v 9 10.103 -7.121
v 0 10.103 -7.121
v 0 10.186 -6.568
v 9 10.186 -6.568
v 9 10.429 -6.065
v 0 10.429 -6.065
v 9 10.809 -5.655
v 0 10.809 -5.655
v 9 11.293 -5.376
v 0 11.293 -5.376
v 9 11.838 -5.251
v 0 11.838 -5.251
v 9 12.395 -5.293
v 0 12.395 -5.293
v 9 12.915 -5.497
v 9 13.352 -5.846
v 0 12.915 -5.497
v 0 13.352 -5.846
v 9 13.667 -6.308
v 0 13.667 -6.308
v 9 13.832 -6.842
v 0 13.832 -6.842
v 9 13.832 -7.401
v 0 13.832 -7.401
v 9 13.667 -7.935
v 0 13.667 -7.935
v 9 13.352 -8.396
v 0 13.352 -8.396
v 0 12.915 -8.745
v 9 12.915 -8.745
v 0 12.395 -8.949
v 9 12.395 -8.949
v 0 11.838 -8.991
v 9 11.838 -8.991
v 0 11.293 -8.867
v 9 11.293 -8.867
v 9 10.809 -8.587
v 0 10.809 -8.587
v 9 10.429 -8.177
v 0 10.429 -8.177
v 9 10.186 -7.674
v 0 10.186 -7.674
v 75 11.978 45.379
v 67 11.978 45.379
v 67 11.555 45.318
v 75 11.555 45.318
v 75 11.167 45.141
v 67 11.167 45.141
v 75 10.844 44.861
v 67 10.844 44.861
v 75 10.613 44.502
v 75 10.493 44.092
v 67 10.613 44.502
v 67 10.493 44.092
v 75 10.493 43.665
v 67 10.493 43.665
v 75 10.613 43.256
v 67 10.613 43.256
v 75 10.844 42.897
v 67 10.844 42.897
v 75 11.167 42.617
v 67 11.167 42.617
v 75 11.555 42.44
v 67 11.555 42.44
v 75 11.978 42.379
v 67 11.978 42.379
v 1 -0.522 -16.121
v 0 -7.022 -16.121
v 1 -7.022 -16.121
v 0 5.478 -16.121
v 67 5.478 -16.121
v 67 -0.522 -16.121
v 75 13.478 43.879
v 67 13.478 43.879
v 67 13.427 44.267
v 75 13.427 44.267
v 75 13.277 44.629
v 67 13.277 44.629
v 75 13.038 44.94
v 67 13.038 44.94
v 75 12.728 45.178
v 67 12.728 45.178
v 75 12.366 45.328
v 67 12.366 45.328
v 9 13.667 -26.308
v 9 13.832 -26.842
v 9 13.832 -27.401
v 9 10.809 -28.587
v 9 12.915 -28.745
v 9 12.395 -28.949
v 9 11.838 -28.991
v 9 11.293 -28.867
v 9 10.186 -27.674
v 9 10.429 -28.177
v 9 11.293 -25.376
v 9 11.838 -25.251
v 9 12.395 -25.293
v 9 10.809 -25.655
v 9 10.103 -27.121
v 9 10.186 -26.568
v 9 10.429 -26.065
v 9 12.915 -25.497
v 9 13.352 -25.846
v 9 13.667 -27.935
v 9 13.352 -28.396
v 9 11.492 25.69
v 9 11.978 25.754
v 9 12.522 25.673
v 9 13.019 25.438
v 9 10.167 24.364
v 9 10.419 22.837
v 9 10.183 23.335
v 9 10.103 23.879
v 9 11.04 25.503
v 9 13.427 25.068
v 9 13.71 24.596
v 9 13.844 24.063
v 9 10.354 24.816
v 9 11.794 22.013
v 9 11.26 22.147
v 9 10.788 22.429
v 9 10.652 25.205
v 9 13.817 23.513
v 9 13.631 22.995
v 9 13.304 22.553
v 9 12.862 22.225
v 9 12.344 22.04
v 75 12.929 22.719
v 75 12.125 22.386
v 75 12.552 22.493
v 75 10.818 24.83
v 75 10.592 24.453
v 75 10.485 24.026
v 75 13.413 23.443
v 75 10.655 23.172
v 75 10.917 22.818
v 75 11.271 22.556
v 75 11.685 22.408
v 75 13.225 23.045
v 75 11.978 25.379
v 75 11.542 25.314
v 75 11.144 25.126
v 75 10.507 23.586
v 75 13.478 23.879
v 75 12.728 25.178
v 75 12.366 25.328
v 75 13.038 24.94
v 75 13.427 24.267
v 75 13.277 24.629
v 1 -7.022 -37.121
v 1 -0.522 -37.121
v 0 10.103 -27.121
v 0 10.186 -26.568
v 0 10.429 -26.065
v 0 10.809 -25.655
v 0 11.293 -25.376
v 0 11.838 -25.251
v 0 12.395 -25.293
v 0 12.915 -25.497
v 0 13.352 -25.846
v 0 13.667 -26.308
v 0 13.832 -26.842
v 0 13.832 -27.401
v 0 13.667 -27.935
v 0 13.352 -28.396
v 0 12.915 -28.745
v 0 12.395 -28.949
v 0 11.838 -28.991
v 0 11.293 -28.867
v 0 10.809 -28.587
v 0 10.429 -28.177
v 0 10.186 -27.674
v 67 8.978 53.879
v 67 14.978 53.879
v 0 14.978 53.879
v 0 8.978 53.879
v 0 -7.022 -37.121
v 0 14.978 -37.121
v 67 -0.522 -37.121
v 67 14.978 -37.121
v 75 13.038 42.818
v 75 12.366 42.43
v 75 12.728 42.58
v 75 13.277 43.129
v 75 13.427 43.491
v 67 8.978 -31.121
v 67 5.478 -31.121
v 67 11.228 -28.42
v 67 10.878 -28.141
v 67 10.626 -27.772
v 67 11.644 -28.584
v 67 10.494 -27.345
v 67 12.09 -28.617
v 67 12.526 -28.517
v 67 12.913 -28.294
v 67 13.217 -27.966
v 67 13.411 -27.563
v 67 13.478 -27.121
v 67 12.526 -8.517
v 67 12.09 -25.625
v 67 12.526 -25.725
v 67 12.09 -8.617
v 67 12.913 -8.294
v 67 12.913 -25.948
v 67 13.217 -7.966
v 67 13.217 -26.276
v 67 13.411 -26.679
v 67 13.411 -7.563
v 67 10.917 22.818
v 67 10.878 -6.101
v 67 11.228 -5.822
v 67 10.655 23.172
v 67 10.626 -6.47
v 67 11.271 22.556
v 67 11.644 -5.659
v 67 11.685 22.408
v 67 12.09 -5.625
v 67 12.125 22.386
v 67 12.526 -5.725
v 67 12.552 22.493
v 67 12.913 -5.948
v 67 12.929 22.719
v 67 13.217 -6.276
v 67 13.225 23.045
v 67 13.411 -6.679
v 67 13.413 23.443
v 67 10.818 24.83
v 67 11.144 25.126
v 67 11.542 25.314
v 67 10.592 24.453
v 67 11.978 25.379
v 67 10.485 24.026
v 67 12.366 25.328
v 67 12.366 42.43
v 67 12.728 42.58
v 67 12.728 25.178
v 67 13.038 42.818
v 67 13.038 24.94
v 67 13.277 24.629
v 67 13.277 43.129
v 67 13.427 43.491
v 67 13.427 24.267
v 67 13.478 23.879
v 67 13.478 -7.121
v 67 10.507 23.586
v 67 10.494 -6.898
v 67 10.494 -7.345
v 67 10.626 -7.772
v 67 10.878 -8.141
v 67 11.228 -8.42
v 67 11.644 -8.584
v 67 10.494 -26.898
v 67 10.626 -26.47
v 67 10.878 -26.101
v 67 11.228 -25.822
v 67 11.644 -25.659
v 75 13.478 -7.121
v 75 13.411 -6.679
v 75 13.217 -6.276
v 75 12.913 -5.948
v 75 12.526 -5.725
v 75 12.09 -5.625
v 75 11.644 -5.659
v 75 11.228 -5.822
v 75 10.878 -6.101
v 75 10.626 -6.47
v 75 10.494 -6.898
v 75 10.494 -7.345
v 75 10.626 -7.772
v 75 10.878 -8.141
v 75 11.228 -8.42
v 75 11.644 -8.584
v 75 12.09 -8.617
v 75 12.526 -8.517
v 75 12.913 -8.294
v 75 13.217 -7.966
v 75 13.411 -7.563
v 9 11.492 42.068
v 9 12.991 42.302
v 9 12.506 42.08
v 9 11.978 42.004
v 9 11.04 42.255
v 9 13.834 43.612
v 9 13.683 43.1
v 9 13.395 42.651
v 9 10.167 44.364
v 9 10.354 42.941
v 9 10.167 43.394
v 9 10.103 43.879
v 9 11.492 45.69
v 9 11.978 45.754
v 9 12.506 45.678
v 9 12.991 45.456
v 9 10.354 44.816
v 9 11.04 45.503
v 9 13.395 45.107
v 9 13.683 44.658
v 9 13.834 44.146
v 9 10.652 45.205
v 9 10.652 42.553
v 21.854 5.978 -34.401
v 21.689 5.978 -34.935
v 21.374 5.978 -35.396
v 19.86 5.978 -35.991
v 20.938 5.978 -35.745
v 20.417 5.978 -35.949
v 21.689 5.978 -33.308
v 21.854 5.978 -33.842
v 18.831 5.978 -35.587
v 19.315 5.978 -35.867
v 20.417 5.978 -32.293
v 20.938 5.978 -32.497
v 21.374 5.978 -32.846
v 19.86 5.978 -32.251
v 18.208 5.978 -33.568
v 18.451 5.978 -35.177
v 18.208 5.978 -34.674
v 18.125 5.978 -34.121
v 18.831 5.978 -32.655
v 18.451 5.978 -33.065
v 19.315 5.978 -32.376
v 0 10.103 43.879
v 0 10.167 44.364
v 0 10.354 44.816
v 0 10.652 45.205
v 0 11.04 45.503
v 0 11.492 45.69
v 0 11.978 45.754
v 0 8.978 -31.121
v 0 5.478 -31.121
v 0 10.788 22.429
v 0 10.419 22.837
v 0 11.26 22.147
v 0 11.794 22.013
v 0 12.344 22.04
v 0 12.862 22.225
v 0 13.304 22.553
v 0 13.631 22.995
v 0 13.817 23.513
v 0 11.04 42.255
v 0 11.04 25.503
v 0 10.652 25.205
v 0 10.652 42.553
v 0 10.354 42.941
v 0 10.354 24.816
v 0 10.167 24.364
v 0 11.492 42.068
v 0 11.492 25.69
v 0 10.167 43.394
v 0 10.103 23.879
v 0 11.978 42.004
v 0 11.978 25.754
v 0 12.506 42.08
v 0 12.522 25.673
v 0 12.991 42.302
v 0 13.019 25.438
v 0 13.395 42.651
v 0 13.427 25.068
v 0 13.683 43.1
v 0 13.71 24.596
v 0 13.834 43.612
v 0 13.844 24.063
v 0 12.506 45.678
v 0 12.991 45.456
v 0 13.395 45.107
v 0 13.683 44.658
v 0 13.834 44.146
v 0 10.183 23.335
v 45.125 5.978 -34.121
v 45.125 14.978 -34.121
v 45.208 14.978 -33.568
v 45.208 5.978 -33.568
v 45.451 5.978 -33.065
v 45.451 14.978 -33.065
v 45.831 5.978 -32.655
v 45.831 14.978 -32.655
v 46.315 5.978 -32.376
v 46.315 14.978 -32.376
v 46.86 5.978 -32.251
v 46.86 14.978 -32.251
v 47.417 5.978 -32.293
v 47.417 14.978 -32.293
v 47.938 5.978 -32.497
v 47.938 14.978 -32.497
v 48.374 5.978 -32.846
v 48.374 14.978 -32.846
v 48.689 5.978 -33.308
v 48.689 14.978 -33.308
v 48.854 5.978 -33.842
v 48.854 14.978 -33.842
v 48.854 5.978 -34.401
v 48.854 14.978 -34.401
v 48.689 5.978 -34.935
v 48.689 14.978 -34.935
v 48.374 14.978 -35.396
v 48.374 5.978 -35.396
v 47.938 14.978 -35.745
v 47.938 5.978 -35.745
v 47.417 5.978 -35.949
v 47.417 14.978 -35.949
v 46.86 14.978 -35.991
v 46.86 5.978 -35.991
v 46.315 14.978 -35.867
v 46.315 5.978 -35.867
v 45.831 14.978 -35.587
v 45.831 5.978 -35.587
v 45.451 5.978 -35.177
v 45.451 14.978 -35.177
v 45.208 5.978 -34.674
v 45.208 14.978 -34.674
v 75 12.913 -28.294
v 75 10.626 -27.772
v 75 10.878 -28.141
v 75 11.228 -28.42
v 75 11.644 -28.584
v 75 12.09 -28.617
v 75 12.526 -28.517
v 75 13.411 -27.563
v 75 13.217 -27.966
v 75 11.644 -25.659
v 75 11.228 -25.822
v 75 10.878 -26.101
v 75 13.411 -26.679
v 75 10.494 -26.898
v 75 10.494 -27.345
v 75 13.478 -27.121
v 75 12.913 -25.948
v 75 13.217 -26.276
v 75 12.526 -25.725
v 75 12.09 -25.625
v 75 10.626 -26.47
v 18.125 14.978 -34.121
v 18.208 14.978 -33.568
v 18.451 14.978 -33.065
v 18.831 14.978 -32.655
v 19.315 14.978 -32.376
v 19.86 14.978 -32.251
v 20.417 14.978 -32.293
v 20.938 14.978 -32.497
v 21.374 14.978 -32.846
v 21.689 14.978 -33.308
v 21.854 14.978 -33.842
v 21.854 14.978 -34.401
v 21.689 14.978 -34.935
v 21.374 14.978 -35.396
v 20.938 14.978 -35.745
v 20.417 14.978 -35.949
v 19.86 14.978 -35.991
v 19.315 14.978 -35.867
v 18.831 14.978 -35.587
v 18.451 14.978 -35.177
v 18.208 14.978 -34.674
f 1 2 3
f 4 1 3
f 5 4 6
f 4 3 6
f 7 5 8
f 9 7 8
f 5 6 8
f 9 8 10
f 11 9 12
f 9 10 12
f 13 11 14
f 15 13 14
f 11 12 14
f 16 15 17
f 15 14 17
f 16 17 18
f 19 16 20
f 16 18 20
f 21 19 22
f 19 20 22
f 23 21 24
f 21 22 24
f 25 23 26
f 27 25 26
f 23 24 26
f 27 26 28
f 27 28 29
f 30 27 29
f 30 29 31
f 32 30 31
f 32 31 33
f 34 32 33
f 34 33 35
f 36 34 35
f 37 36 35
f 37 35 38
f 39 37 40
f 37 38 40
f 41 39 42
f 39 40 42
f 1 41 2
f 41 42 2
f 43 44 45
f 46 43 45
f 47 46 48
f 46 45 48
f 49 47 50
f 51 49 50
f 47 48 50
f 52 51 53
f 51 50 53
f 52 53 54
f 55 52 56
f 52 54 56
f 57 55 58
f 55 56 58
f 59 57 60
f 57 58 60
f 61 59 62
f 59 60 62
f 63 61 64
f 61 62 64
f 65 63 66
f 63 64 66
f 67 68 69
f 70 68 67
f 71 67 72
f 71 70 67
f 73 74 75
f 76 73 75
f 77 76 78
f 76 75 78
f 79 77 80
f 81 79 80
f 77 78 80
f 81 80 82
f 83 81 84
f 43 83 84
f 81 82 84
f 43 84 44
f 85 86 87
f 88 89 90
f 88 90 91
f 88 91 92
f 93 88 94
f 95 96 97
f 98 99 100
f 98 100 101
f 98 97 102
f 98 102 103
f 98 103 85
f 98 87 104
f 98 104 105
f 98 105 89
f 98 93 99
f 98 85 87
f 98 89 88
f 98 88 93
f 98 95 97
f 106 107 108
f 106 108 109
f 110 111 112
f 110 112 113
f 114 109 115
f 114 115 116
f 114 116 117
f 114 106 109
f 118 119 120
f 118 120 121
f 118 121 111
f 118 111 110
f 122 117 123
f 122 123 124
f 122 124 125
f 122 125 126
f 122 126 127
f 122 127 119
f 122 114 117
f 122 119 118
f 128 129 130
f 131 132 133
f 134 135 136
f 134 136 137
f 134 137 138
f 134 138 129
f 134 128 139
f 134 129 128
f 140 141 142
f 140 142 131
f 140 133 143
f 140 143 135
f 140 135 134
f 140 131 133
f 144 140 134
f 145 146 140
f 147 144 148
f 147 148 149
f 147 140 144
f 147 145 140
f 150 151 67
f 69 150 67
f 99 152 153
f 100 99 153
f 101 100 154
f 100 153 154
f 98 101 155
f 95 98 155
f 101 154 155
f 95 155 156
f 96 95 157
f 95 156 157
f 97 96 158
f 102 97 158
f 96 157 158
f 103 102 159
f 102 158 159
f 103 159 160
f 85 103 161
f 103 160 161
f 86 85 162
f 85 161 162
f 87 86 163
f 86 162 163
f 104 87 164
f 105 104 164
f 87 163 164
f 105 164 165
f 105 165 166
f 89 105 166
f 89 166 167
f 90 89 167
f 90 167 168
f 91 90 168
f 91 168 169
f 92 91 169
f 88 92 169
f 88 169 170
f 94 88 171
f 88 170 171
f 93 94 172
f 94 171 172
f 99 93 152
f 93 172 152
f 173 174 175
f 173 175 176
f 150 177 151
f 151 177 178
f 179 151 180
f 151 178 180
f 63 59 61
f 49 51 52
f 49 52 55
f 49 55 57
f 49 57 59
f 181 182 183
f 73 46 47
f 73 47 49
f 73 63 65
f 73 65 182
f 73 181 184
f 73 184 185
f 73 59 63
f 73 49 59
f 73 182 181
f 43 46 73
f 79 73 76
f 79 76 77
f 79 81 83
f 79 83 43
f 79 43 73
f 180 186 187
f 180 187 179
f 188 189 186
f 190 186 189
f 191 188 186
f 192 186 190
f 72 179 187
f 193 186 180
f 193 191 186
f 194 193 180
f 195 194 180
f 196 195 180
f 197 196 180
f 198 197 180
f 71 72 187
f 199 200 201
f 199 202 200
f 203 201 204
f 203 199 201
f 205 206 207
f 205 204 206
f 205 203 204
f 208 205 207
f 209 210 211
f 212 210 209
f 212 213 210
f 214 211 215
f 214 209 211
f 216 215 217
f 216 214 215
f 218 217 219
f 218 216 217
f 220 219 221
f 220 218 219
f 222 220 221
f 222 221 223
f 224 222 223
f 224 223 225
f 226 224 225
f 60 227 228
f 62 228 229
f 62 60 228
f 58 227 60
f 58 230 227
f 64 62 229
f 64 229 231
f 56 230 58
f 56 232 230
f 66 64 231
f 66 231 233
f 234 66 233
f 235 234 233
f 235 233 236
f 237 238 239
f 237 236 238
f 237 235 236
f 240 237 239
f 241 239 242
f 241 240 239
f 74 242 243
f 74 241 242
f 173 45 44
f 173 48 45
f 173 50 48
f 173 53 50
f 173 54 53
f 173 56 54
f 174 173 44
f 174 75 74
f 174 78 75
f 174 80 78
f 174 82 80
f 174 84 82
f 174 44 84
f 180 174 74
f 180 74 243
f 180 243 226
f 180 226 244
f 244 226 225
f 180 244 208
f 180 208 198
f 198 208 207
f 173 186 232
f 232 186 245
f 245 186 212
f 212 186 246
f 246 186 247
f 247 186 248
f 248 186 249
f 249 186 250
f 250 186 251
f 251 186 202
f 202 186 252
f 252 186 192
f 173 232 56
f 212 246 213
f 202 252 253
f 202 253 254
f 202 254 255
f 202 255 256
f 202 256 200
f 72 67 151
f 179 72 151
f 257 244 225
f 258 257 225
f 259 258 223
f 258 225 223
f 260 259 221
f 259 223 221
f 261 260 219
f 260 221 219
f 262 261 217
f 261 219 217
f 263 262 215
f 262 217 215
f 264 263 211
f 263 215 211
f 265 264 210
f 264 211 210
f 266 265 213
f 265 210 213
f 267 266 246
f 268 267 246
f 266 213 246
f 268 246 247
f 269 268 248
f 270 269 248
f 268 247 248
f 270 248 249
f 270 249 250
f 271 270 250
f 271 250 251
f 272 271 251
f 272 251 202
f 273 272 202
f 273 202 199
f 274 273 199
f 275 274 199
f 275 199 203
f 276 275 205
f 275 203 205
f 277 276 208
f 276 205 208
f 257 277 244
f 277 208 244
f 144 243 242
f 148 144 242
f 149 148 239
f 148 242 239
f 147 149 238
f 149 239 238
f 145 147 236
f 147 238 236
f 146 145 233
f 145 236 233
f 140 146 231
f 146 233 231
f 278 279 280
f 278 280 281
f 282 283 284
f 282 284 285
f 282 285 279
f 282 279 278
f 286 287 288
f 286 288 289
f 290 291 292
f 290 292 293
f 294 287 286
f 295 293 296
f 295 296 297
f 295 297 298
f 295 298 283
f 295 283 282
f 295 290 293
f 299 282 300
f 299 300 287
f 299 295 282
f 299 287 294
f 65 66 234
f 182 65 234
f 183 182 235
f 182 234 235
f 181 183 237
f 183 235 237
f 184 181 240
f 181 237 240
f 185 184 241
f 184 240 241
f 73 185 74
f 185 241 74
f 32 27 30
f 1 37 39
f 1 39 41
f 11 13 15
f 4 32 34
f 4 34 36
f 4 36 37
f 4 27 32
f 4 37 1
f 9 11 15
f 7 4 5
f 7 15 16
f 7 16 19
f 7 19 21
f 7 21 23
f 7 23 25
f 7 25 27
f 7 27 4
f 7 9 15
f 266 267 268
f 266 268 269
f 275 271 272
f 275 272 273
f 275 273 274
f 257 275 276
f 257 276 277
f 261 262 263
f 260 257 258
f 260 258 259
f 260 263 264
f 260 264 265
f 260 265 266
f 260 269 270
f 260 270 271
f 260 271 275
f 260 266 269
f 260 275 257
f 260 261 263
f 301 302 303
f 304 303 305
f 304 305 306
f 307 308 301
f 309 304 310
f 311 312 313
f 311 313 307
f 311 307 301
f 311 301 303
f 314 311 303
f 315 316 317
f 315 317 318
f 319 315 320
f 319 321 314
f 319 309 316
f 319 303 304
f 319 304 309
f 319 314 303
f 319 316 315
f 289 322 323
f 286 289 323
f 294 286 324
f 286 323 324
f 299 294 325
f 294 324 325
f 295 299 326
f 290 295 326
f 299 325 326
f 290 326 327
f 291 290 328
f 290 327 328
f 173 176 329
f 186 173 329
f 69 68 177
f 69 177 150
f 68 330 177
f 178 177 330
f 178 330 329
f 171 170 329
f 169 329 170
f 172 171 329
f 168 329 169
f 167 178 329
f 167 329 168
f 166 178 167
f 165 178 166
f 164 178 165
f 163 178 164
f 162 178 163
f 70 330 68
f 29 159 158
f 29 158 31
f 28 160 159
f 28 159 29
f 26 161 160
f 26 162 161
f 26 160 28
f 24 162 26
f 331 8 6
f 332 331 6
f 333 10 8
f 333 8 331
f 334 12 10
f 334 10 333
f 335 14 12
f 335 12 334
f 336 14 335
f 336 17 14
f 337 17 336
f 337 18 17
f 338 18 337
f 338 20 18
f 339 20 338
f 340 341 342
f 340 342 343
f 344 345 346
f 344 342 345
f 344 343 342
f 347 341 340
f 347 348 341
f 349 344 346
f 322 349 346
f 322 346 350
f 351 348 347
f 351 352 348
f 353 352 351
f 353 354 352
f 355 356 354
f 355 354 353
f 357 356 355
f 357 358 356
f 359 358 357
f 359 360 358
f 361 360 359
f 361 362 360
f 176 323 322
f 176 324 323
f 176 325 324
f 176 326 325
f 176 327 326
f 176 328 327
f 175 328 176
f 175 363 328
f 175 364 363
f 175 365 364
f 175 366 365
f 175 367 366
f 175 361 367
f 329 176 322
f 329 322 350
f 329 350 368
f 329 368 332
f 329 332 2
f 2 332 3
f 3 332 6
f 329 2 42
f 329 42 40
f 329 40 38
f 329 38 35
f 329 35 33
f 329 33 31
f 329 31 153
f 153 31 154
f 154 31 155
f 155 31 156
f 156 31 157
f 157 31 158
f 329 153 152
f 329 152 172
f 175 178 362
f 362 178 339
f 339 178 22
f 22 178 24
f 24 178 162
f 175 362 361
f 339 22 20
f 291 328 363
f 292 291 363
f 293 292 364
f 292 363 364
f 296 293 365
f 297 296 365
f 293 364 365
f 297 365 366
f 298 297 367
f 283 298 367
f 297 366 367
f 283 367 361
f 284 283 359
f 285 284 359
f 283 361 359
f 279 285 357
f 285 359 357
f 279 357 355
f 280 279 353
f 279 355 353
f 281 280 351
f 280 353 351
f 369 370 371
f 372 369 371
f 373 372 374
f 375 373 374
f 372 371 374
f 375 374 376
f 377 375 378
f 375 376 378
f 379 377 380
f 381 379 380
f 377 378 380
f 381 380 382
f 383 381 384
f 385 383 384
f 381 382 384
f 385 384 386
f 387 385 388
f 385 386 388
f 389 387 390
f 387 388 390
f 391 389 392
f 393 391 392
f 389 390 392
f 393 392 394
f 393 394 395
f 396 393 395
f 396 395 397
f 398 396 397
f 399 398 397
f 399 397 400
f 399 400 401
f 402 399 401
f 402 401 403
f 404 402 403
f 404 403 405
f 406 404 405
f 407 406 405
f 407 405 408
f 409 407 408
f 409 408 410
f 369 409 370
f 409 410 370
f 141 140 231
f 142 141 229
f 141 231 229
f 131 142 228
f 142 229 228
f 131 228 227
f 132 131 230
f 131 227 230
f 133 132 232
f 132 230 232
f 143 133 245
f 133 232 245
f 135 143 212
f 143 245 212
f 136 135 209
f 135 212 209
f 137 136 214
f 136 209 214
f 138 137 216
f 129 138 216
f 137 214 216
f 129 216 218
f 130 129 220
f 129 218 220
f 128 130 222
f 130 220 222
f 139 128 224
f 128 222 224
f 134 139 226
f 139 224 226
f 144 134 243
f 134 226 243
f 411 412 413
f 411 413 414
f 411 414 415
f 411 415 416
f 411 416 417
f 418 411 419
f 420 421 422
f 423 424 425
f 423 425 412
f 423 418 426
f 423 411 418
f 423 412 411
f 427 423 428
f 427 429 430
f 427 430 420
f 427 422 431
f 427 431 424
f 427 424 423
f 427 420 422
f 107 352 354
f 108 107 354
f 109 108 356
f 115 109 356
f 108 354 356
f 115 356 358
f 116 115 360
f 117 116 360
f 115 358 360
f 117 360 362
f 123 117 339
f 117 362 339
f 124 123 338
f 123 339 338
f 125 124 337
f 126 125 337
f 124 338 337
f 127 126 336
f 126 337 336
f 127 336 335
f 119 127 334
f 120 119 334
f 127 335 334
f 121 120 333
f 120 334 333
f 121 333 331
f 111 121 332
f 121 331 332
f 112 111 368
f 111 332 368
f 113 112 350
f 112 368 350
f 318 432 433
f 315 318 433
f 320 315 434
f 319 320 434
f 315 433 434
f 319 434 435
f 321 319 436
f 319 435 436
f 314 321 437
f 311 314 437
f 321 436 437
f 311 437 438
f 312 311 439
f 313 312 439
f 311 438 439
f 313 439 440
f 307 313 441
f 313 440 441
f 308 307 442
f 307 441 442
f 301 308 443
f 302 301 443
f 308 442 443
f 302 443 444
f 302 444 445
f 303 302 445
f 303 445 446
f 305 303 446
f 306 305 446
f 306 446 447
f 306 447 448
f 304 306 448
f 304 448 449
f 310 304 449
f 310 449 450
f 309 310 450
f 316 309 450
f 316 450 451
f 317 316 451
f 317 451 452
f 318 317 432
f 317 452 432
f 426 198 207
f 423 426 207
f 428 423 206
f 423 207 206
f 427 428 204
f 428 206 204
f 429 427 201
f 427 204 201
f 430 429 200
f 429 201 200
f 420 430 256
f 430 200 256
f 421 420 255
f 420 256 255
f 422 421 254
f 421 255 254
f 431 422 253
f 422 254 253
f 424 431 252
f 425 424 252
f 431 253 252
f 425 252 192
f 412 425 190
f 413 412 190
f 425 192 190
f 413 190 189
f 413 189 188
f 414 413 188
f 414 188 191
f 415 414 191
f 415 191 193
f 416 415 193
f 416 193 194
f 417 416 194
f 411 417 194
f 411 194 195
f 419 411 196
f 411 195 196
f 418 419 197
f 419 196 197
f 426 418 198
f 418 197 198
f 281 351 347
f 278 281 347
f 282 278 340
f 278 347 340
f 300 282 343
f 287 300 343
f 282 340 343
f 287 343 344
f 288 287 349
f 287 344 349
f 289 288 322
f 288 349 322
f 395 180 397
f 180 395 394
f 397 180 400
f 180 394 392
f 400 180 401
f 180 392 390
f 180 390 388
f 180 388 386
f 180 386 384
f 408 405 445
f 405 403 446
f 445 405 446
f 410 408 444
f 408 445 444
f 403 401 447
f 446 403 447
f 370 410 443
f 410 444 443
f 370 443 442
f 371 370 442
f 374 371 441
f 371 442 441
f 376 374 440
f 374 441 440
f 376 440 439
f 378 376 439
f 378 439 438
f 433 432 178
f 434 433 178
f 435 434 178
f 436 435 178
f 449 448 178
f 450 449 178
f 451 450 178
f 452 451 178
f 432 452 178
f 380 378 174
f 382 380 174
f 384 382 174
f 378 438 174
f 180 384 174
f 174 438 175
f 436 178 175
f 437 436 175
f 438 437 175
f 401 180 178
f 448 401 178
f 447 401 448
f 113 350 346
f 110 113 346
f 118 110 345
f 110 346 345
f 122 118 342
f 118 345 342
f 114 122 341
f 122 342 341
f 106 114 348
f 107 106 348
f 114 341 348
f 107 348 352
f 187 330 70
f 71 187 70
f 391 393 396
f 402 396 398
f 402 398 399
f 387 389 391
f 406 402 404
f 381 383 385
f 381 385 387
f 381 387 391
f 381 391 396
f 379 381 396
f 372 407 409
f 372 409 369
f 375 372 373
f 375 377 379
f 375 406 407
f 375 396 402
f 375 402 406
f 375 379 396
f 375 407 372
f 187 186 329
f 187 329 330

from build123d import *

# Parameters (mm, degrees)
F1_DEPTH  = 67
F2_R      = 1.5
F3_DEPTH  = 8
F4_R      = 1.875
F5_DEPTH  = 9
F6_R      = 1.875
F7_DEPTH  = 9
F8_W      = 1
F8_H      = 21
F9_DEPTH  = 6.5
F10_R     = 1.875
F11_DEPTH = 9


# Not quite as in the source:
# - a feature names something its author has since deleted; it is built from what else it names


with BuildPart() as f1:
    # F0 (on Right) → F1 (new body)
    with BuildSketch(Plane.YZ):
        Polygon((14.9777059274, -37.1211464703), (14.9777059274, 53.8788535297), (8.9777059274, 53.8788535297), (8.9777059274, -31.1211464703), (5.4777059274, -31.1211464703), (5.4777059274, -16.1211464703), (-0.5222940726, -16.1211464703), (-0.5222940726, -37.1211464703), align=None)
    extrude(amount=F1_DEPTH)

    # F2 (on face) → F3 (join)
    with BuildSketch(Plane.YZ.offset(67)):
        with BuildLine():
            Line((11.9777059274, 43.8788535297), (11.9777059274, 45.3788535297))
            ThreePointArc((11.9777059274, 45.3788535297), (10.4777059274, 43.8788535297), (11.9777059274, 42.3788535297))
            Line((11.9777059274, 42.3788535297), (11.9777059274, 43.8788535297))
        make_face()
        with BuildLine():
            ThreePointArc((11.9777059274, 42.3788535297), (13.0383660992, 42.8181933579), (13.4777059274, 43.8788535297))
            ThreePointArc((13.4777059274, 43.8788535297), (13.0383660992, 44.9395137015), (11.9777059274, 45.3788535297))
            Line((11.9777059274, 45.3788535297), (11.9777059274, 43.8788535297))
            Line((11.9777059274, 43.8788535297), (11.9777059274, 42.3788535297))
        make_face()
        with BuildLine():
            ThreePointArc((13.4777059274, 23.8788535297), (13.0383660992, 24.9395137015), (11.9777059274, 25.3788535297))
            ThreePointArc((11.9777059274, 25.3788535297), (10.9170457557, 22.8181933579), (13.4777059274, 23.8788535297))
        make_face()
        with Locations((11.9777059274, -7.1211464703)):
            Circle(F2_R)
        with Locations((11.9777059274, -27.1211464703)):
            Circle(F2_R)
    extrude(amount=F3_DEPTH)

    # F4 (on face) → F5 (cut)
    with BuildSketch(Plane(origin=(0, 0, 0), x_dir=(0, -1, 0), z_dir=(-1, 0, 0))):
        with Locations((-18.4777059274, 23.8788535297)):
            Circle(F4_R)
        with Locations((-18.4777059274, 43.8788535297)):
            Circle(F4_R)
        with Locations((-18.4777059274, -7.1211464703)):
            Circle(F4_R)
        with Locations((-18.4777059274, -27.1211464703)):
            Circle(F4_R)
    extrude(amount=-F5_DEPTH, mode=Mode.SUBTRACT)

    # F6 (on face) → F7 (cut)
    with BuildSketch(Plane(origin=(0, 14.9777059274, 0), x_dir=(-1, 0, 0), z_dir=(0, 1, 0))):
        with Locations((-47, -34.1211464703)):
            Circle(F6_R)
        with Locations((-20, -34.1211464703)):
            Circle(F6_R)
    extrude(amount=-F7_DEPTH, mode=Mode.SUBTRACT)

    # F8 (on face) → F9 (join)
    with BuildSketch(Plane.XZ.offset(0.5222940726)):
        with Locations((0.5, -26.6211464703)):
            Rectangle(F8_W, F8_H)
    extrude(amount=F9_DEPTH)

    # F10 (on face) → F11 (cut)
    with BuildSketch(Plane(origin=(0, 0, 0), x_dir=(0, -1, 0), z_dir=(-1, 0, 0))):
        with BuildLine():
            ThreePointArc((-10.1027059274, 43.8788535297), (-10.6518807127, 45.2046787444), (-11.9777059274, 45.7538535297))
            Line((-11.9777059274, 45.7538535297), (-11.9777059274, 43.8788535297))
            Line((-11.9777059274, 43.8788535297), (-11.9777059274, 42.0038535297))
            ThreePointArc((-11.9777059274, 42.0038535297), (-10.6518807127, 42.553028315), (-10.1027059274, 43.8788535297))
        make_face()
        with BuildLine():
            ThreePointArc((-10.1027059274, 23.8788535297), (-10.6518807127, 25.2046787444), (-11.9777059274, 25.7538535297))
            ThreePointArc((-11.9777059274, 25.7538535297), (-13.3035311422, 22.553028315), (-10.1027059274, 23.8788535297))
        make_face()
        with BuildLine():
            Line((-11.9777059274, 43.8788535297), (-11.9777059274, 45.7538535297))
            ThreePointArc((-11.9777059274, 45.7538535297), (-13.8527059274, 43.8788535297), (-11.9777059274, 42.0038535297))
            Line((-11.9777059274, 42.0038535297), (-11.9777059274, 43.8788535297))
        make_face()
        with Locations((-11.9777059274, -27.1211464703)):
            Circle(F10_R)
        with Locations((-11.9777059274, -7.1211464703)):
            Circle(F10_R)
    extrude(amount=-F11_DEPTH, mode=Mode.SUBTRACT)


solid = f1.part
